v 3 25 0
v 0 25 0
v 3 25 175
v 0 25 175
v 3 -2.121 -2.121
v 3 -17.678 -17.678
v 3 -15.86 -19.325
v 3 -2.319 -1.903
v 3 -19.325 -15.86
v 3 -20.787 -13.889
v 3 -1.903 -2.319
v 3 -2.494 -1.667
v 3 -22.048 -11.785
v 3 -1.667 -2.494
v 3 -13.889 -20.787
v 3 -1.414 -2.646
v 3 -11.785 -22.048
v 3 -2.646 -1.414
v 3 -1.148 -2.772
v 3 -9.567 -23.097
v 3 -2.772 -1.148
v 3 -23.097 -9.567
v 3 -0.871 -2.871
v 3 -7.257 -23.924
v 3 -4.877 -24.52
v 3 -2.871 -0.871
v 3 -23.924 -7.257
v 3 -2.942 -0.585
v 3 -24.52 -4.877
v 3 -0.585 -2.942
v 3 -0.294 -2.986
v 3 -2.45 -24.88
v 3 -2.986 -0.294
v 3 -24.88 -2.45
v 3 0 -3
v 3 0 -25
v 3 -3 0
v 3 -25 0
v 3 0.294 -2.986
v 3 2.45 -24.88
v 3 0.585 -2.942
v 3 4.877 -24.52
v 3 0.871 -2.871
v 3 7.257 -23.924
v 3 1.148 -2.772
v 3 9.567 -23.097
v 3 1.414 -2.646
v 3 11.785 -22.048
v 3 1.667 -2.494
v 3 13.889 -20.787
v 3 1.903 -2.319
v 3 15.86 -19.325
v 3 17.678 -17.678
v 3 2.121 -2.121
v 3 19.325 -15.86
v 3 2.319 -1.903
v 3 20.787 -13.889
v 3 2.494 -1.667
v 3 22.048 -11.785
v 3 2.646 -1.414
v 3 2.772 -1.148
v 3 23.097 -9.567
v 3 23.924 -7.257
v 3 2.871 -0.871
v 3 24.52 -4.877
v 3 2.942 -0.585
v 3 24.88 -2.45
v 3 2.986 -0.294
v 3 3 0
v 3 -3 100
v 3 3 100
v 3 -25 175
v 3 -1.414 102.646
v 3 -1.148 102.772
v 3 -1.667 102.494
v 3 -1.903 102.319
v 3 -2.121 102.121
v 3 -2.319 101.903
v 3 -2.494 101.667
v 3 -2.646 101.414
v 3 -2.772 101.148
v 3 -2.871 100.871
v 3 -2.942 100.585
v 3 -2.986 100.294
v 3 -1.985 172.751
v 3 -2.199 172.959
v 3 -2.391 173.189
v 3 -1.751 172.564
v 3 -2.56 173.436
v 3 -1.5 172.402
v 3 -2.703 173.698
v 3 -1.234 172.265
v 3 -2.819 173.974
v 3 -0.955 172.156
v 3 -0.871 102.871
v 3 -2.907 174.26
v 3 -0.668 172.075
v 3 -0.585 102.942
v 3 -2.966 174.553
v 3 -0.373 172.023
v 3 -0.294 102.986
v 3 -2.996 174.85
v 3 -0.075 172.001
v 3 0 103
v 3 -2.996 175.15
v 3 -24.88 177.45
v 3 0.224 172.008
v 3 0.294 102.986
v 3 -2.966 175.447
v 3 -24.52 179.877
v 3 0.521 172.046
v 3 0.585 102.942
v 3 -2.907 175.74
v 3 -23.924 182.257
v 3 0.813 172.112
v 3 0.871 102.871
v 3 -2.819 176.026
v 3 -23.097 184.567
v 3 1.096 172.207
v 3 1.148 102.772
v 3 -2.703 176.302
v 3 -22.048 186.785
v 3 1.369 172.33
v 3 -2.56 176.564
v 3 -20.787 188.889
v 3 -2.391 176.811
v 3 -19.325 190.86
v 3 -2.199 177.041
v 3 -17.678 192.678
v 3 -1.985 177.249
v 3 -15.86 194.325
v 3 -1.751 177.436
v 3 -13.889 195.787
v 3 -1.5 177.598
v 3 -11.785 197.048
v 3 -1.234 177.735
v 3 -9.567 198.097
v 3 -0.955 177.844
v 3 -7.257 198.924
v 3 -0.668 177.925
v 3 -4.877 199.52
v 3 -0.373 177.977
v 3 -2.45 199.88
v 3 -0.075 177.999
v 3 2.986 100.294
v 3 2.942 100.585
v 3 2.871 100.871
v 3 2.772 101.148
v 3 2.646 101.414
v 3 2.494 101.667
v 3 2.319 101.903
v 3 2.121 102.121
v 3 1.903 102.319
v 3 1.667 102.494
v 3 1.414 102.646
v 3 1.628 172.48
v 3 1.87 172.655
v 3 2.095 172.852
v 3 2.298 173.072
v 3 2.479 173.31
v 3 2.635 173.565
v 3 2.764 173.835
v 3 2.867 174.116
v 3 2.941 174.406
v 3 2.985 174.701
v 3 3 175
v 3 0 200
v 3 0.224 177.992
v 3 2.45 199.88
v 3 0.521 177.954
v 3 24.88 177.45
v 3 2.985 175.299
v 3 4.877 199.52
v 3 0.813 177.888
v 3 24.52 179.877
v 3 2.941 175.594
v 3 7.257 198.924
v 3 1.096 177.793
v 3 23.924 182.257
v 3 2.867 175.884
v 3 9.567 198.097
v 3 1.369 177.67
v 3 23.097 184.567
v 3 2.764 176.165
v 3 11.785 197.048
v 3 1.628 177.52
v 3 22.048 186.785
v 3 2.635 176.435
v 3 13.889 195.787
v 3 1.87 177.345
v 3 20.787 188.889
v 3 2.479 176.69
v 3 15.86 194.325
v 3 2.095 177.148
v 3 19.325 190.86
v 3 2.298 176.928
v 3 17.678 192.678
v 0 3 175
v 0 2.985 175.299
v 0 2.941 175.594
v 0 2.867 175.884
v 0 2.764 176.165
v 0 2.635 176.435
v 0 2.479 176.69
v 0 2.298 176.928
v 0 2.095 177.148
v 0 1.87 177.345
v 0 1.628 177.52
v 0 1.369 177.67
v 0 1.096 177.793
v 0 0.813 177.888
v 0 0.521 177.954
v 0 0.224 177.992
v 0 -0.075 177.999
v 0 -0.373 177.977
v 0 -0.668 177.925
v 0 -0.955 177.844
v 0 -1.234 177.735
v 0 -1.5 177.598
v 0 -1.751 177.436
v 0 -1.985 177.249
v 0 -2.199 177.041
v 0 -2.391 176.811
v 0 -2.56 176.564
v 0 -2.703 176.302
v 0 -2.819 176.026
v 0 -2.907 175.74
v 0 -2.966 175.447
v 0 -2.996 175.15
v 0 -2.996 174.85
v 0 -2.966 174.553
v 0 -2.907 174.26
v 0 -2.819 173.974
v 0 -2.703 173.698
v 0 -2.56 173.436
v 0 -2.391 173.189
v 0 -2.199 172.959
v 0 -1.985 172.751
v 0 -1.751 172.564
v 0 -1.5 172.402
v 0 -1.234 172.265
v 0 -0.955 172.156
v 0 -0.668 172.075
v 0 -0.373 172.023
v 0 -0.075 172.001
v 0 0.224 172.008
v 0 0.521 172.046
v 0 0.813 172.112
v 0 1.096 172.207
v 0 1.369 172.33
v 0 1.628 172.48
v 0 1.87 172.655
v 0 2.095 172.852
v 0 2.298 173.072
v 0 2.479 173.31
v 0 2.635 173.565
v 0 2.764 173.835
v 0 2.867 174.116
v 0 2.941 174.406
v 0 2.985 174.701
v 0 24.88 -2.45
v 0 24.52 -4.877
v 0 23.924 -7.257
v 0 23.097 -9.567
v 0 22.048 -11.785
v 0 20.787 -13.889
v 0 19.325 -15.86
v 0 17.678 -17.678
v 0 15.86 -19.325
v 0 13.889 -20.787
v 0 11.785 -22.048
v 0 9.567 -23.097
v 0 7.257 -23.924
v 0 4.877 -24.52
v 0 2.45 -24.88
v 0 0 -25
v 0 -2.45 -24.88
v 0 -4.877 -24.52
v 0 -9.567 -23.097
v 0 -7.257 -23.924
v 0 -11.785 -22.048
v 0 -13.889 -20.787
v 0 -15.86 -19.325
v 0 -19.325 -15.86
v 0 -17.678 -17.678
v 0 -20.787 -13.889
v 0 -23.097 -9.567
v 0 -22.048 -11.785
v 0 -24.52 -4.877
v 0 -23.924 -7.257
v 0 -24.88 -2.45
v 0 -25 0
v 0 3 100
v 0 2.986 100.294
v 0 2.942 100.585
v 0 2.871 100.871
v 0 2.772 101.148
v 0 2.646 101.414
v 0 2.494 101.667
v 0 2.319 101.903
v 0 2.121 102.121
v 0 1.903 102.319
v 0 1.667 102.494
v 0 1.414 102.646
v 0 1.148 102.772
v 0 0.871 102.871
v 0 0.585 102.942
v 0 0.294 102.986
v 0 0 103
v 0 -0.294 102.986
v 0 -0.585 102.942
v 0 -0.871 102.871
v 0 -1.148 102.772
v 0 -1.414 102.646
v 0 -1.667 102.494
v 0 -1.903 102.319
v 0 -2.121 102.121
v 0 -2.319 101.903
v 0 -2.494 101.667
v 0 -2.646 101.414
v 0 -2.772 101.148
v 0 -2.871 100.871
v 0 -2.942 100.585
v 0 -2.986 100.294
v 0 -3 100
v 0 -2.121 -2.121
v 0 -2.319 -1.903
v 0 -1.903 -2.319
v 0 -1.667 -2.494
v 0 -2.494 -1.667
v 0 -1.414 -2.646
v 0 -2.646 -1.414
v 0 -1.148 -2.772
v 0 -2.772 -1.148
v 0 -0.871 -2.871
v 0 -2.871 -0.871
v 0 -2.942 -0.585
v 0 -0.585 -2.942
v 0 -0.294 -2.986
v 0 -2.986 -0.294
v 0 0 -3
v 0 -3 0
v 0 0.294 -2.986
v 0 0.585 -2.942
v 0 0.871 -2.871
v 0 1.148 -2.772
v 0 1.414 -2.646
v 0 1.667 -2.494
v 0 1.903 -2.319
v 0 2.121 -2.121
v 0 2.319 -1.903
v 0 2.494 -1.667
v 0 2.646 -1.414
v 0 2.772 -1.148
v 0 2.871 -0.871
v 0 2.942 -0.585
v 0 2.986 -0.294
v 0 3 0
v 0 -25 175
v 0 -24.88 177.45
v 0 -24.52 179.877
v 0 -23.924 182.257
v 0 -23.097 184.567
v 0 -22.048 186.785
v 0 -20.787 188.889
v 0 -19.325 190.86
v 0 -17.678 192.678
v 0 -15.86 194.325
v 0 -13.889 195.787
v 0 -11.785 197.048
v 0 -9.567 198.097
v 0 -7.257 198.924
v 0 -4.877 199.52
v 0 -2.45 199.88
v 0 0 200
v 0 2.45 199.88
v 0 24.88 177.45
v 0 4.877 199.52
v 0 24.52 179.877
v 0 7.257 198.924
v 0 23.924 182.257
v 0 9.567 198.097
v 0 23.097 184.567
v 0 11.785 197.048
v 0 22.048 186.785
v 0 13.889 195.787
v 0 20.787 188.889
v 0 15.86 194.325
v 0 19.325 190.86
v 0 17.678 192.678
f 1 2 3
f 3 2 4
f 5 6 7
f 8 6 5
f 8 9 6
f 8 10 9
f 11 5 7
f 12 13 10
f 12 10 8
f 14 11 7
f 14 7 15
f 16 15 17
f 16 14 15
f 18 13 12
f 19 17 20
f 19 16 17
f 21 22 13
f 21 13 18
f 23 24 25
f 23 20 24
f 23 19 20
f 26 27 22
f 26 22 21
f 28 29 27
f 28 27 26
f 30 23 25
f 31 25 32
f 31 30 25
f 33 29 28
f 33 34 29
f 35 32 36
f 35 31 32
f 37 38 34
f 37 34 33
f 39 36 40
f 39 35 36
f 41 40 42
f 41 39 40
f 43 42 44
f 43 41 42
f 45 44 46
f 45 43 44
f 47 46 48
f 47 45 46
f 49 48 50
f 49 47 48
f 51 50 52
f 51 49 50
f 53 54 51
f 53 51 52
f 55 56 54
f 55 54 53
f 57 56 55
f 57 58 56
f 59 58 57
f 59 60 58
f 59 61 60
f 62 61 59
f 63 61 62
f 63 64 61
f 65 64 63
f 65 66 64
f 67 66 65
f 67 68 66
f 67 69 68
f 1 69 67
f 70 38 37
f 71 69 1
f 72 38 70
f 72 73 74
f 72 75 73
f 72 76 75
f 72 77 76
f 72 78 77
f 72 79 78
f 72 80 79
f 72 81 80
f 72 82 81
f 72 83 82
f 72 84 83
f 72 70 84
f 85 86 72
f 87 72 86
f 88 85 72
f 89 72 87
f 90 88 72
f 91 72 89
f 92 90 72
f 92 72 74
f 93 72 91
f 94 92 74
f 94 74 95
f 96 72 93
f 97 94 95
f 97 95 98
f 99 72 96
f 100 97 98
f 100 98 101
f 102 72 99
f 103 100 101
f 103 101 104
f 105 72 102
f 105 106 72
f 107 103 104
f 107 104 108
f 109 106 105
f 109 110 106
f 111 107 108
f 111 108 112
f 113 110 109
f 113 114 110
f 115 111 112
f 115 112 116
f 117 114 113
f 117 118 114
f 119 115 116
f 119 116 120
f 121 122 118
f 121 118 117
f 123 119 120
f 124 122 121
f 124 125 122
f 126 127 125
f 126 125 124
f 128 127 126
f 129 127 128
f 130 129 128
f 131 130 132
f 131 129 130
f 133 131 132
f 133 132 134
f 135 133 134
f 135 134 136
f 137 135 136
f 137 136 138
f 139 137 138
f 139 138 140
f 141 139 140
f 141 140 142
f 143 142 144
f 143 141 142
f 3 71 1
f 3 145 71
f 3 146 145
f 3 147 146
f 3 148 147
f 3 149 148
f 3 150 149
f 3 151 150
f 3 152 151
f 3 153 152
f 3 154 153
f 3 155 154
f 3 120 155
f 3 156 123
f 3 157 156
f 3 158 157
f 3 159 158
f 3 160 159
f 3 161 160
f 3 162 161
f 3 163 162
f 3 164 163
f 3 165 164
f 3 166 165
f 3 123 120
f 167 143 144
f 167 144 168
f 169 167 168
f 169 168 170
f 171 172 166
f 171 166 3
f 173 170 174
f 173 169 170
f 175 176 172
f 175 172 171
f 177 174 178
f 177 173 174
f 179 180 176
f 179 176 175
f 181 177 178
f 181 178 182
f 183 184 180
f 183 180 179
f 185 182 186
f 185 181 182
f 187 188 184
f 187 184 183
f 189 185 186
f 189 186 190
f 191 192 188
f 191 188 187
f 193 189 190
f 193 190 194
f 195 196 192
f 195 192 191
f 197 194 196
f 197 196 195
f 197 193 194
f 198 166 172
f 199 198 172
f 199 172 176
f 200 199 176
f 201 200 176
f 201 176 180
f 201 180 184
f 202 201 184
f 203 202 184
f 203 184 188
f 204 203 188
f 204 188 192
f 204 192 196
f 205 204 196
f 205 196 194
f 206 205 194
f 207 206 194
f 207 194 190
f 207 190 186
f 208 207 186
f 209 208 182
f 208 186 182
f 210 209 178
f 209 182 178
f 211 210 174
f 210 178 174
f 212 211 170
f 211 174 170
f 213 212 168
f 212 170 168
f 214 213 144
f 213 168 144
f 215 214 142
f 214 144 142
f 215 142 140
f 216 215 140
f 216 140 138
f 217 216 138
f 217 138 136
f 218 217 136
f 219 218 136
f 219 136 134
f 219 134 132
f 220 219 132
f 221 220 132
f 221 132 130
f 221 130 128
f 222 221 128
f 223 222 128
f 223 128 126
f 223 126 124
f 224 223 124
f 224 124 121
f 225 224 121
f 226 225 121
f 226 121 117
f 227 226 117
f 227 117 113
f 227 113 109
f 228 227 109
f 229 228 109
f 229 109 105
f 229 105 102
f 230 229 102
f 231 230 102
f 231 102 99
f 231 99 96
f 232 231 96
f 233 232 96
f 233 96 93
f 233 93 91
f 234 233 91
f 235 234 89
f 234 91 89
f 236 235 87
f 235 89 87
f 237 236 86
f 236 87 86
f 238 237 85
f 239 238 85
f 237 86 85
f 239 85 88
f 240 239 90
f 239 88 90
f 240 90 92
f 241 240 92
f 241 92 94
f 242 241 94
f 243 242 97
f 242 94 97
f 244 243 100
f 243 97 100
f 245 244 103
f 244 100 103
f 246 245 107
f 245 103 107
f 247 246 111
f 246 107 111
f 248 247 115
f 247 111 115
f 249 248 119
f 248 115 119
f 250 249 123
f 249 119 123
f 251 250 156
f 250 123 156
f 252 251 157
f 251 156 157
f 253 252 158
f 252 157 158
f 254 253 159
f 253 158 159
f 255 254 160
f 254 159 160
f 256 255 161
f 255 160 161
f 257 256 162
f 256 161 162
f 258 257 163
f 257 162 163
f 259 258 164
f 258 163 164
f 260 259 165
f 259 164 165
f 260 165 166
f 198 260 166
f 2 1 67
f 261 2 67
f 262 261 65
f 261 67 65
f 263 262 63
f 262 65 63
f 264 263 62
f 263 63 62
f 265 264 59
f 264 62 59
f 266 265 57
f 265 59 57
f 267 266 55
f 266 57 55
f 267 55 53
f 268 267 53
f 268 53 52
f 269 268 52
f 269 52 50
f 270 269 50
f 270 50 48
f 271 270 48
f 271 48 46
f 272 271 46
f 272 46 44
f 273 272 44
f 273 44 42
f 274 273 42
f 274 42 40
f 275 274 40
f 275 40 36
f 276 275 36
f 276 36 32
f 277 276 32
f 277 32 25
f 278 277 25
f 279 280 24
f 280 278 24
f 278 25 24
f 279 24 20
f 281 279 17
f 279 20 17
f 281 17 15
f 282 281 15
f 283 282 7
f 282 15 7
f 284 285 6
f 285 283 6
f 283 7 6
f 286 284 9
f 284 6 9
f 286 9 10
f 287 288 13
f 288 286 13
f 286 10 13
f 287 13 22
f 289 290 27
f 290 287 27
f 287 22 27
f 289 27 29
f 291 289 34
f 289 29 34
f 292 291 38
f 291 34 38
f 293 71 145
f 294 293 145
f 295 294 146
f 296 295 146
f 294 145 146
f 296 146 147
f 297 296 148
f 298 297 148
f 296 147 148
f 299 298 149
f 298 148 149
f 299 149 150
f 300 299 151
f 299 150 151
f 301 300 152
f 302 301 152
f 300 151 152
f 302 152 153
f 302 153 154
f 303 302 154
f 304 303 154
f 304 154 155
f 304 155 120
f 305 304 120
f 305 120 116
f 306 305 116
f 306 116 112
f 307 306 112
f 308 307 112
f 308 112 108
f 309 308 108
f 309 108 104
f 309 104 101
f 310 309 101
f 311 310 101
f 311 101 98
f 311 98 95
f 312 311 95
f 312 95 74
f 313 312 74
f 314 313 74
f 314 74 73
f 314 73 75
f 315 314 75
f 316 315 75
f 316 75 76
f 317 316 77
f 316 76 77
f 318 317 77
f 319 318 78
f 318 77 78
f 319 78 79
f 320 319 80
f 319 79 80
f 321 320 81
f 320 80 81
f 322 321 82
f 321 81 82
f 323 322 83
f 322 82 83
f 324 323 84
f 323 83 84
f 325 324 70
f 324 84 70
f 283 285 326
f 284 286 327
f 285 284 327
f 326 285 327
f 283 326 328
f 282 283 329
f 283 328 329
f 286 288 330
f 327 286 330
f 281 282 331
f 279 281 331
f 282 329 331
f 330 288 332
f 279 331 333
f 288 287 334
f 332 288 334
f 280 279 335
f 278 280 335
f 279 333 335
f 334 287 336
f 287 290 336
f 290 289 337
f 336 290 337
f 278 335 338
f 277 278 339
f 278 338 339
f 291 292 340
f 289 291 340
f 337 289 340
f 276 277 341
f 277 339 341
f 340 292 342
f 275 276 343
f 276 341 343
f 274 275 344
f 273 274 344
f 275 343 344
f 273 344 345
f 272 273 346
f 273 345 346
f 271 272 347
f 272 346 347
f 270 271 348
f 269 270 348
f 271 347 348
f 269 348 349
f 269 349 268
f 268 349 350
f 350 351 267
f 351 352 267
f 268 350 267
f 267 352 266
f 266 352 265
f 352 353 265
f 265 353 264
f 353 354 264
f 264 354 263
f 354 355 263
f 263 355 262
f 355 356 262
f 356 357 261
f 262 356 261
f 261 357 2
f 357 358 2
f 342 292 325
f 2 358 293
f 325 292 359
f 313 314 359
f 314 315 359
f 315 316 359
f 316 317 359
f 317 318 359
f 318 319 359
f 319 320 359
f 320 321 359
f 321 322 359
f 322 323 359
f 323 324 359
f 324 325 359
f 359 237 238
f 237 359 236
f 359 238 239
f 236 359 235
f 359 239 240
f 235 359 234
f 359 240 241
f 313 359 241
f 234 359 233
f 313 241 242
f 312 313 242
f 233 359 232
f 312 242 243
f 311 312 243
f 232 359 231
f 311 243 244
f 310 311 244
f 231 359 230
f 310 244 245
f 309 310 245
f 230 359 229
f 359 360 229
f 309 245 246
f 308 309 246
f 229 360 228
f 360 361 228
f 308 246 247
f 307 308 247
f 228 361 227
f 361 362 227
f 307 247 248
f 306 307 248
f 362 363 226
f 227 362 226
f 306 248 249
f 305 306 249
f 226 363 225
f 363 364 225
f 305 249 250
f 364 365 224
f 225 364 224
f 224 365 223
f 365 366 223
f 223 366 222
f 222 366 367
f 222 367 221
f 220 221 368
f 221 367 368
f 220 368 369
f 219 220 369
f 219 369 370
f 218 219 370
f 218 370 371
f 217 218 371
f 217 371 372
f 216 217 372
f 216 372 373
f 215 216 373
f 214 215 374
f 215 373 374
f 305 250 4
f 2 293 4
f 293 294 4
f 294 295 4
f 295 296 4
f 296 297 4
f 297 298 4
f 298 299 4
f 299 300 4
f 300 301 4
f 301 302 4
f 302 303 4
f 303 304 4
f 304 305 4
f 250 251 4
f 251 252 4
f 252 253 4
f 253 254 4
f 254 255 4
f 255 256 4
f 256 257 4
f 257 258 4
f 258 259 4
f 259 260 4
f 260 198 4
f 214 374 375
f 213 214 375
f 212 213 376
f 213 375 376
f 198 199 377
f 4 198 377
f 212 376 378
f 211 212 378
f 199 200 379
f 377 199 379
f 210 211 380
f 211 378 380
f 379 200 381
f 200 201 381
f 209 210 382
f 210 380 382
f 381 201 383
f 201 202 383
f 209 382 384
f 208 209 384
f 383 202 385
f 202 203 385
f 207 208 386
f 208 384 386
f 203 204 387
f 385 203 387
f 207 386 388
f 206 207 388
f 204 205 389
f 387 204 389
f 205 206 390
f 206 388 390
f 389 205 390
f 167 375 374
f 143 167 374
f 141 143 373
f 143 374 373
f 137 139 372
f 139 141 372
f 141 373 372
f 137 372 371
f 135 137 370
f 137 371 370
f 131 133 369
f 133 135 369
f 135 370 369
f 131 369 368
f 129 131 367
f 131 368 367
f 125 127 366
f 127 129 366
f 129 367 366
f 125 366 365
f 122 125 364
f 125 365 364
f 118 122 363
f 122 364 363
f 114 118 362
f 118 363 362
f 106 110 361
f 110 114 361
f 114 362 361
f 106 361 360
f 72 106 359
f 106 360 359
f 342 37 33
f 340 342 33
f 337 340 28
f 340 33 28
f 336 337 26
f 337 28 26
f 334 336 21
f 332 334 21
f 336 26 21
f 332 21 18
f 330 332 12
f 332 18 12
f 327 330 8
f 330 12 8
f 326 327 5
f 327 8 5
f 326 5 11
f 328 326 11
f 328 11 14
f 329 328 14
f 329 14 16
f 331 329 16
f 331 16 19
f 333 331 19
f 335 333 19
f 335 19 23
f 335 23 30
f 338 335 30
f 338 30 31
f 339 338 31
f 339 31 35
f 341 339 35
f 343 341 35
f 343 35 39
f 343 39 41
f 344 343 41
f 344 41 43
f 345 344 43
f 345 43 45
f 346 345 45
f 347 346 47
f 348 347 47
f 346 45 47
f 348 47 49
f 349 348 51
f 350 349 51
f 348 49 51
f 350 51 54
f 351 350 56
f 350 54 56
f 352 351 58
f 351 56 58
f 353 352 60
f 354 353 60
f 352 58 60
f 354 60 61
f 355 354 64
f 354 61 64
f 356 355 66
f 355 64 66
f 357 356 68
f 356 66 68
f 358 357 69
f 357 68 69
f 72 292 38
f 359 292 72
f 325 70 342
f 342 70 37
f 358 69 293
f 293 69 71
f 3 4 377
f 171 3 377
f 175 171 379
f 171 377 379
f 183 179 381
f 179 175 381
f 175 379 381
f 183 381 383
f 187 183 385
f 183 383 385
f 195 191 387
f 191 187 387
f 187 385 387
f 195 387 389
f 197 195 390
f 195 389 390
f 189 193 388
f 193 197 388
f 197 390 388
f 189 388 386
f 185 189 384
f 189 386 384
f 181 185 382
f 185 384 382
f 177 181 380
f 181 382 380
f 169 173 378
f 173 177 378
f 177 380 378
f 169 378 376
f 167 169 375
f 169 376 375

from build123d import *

# Parameters (mm, degrees)
F0_W        = 50
F0_H        = 400
F1_DEPTH    = 3
F2_T1_DEPTH = 128
F3_R        = 3
F4_DEPTH    = 25
F6_DEPTH    = 25
F8_DEPTH    = 25


# Not quite as in the source:
# - a fillet or chamfer that OpenCascade refuses, or shapes differently, is made with other operations: its cross-section is extruded or revolved along the edge and cut away or added


with BuildPart() as f1:
    # F0 (on Right) → F1 (new body)
    with BuildSketch(Plane.YZ):
        Rectangle(F0_W, F0_H)
    extrude(amount=F1_DEPTH)

    # F2: fillet of radius 25 on 4 edges, made by hand

    # F2_s2 → F2_t1 (cut)
    with BuildSketch(Plane.YZ.offset(-62.5)):
        with BuildLine():
            ThreePointArc((0, 200), (-17.6776695297, 192.6776695297), (-25, 175))
            Line((-25, 175), (-25, 200))
            Line((-25, 200), (0, 200))
        make_face()
        with BuildLine():
            ThreePointArc((-25, -175), (-17.6776695297, -192.6776695297), (0, -200))
            Line((0, -200), (-25, -200))
            Line((-25, -200), (-25, -175))
        make_face()
        with BuildLine():
            ThreePointArc((25, 175), (17.6776695297, 192.6776695297), (0, 200))
            Line((0, 200), (25, 200))
            Line((25, 200), (25, 175))
        make_face()
        with BuildLine():
            ThreePointArc((25, -175), (17.6776695297, -192.6776695297), (0, -200))
            Line((0, -200), (25, -200))
            Line((25, -200), (25, -175))
        make_face()
    extrude(amount=F2_T1_DEPTH, mode=Mode.SUBTRACT)

    # F3 (on face) → F4 (cut)
    with BuildSketch(Plane.YZ.offset(3)):
        with Locations((0, 175)):
            Circle(F3_R)
    extrude(amount=-F4_DEPTH, mode=Mode.SUBTRACT)

    # F5 (on face) → F6 (cut)
    with BuildSketch(Plane.YZ.offset(3)):
        with BuildLine():
            ThreePointArc((-3, 100), (0, 97), (3, 100))
            ThreePointArc((3, 100), (0, 103), (-3, 100))
        make_face()
        with BuildLine():
            Line((3, 0), (3, 100))
            ThreePointArc((3, 100), (0, 97), (-3, 100))
            Line((-3, 100), (-3, 0))
            ThreePointArc((-3, 0), (0, 3), (3, 0))
        make_face()
        with BuildLine():
            ThreePointArc((-3, 0), (0, -3), (3, 0))
            ThreePointArc((3, 0), (0, 3), (-3, 0))
        make_face()
    extrude(amount=-F6_DEPTH, mode=Mode.SUBTRACT)

    # F7 (on face) → F8 (cut)
    with BuildSketch(Plane.YZ.offset(3)):
        with BuildLine():
            ThreePointArc((25, 0), (0, -25), (-25, 0))
            Line((-25, 0), (-25, -175))
            ThreePointArc((-25, -175), (0, -200), (25, -175))
            Line((25, -175), (25, 0))
        make_face()
    extrude(amount=-F8_DEPTH, mode=Mode.SUBTRACT)


solid = f1.part
